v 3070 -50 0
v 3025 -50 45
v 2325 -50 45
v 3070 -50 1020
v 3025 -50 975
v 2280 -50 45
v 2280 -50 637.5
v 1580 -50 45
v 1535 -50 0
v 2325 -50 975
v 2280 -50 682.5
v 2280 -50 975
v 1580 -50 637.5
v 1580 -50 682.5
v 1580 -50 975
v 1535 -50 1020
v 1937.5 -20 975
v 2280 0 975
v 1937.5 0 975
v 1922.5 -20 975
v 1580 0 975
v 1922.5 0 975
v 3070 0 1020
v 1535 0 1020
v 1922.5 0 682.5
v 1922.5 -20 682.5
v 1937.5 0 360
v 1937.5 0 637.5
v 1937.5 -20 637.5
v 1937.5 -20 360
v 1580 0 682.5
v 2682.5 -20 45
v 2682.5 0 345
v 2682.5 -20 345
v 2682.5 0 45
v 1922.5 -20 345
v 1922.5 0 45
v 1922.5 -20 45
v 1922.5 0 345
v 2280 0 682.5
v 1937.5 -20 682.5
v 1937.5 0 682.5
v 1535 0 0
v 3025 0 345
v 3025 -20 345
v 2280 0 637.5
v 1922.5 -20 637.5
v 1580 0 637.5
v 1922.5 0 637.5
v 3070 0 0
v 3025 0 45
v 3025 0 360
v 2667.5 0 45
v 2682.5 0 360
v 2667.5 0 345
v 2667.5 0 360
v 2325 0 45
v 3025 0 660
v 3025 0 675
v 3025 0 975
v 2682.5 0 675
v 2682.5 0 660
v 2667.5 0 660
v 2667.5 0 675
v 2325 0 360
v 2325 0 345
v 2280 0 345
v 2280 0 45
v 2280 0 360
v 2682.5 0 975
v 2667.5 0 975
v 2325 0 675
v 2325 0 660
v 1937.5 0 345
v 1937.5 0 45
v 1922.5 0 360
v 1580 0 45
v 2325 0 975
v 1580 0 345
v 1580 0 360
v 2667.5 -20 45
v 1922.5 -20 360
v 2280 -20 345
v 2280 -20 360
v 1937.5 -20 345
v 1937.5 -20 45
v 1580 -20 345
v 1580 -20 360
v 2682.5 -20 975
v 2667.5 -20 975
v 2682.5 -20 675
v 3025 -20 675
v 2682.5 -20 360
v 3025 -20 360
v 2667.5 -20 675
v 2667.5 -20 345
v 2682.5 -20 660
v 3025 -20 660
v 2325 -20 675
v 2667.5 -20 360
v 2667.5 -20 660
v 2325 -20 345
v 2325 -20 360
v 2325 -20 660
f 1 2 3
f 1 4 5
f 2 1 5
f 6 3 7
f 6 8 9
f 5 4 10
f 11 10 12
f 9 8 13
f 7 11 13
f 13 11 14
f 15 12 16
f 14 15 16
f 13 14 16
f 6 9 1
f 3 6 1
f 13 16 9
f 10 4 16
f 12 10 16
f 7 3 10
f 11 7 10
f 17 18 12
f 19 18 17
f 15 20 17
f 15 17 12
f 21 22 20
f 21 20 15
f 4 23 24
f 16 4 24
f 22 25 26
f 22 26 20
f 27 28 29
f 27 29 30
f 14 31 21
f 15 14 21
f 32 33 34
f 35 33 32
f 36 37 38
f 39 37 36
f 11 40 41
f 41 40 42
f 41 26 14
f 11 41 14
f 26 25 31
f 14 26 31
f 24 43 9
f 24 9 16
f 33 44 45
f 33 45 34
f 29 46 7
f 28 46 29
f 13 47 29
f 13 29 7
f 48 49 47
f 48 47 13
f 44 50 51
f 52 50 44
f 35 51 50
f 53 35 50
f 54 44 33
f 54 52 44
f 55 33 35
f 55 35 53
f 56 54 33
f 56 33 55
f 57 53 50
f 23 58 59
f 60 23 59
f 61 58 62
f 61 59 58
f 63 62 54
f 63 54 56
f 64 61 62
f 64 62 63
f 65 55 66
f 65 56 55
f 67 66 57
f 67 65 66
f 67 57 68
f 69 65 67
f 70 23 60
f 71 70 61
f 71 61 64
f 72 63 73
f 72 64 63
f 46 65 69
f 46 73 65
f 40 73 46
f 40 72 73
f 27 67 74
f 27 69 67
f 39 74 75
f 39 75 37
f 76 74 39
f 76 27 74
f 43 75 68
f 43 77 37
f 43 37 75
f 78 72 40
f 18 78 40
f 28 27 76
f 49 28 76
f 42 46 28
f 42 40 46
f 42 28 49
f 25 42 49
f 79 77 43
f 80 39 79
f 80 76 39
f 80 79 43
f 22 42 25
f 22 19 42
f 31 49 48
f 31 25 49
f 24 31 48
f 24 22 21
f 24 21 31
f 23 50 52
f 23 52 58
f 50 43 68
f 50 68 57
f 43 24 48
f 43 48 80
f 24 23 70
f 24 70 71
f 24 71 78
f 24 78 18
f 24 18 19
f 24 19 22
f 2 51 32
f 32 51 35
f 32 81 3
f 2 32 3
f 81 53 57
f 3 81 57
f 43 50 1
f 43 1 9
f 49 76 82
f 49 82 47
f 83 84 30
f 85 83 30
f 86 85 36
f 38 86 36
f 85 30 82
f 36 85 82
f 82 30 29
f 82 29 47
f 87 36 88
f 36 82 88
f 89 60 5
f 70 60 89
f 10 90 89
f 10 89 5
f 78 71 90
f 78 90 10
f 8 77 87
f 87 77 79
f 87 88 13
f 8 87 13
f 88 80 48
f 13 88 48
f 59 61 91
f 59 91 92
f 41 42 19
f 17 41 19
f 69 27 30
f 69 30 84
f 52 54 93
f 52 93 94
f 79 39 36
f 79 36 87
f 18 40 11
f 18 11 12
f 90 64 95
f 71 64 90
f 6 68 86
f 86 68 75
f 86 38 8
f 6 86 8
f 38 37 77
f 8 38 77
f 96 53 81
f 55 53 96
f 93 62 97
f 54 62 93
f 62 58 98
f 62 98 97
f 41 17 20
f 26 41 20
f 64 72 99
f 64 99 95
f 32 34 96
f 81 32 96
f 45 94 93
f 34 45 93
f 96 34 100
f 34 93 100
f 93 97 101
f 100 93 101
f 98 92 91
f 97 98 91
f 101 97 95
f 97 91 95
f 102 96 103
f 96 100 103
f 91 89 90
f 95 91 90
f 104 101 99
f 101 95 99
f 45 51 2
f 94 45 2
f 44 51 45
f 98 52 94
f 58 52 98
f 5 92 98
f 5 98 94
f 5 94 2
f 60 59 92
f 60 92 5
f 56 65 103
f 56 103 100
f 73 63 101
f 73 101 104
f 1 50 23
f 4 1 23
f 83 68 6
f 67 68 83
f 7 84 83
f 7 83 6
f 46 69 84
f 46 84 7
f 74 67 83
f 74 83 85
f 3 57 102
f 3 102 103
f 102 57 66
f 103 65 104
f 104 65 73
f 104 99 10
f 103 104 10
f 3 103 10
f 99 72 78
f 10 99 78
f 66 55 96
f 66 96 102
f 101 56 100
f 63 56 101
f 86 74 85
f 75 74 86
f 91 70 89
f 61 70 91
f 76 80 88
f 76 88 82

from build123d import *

# Parameters (mm, degrees)
F0_W     = 1535
F0_H     = 1020
F0_W_2   = 700
F0_H_2   = 592.5
F0_H_3   = 930
F0_H_4   = 292.5
F1_DEPTH = 50
F2_W     = 15
F2_H     = 292.5
F3_DEPTH = 20


with BuildPart() as f1:
    # F0 (on Front) → F1 (new body)
    with BuildSketch(Plane.XZ):
        with Locations((767.5, 510)):
            Rectangle(F0_W, F0_H)
        with Locations((1140, 341.25)):
            Rectangle(F0_W_2, F0_H_2, mode=Mode.SUBTRACT)
        with Locations((395, 510)):
            Rectangle(F0_W_2, F0_H_3, mode=Mode.SUBTRACT)
        with Locations((1140, 828.75)):
            Rectangle(F0_W_2, F0_H_4, mode=Mode.SUBTRACT)
    extrude(amount=F1_DEPTH)

    # F2 (on Front) → F3 (join)
    with BuildSketch(Plane.XZ):
        Polygon((402.5, 975), (387.5, 975), (387.5, 675), (45, 675), (45, 660), (387.5, 660), (387.5, 360), (45, 360), (45, 345), (387.5, 345), (387.5, 45), (402.5, 45), (402.5, 345), (745, 345), (745, 360), (402.5, 360), (402.5, 660), (745, 660), (745, 675), (402.5, 675), align=None)
        Polygon((1132.5, 360), (790, 360), (790, 345), (1132.5, 345), (1132.5, 45), (1147.5, 45), (1147.5, 345), (1490, 345), (1490, 360), (1147.5, 360), (1147.5, 637.5), (1132.5, 637.5), align=None)
        with Locations((1140, 828.75)):
            Rectangle(F2_W, F2_H)
    extrude(amount=F3_DEPTH)


with BuildPart() as f4_1:
    # F4: instance of F1
    add(f1.part.mirror(Plane(origin=(1535, -25, 510), x_dir=(0, 1, 0), z_dir=(1, 0, 0))))


solid = f4_1.part
